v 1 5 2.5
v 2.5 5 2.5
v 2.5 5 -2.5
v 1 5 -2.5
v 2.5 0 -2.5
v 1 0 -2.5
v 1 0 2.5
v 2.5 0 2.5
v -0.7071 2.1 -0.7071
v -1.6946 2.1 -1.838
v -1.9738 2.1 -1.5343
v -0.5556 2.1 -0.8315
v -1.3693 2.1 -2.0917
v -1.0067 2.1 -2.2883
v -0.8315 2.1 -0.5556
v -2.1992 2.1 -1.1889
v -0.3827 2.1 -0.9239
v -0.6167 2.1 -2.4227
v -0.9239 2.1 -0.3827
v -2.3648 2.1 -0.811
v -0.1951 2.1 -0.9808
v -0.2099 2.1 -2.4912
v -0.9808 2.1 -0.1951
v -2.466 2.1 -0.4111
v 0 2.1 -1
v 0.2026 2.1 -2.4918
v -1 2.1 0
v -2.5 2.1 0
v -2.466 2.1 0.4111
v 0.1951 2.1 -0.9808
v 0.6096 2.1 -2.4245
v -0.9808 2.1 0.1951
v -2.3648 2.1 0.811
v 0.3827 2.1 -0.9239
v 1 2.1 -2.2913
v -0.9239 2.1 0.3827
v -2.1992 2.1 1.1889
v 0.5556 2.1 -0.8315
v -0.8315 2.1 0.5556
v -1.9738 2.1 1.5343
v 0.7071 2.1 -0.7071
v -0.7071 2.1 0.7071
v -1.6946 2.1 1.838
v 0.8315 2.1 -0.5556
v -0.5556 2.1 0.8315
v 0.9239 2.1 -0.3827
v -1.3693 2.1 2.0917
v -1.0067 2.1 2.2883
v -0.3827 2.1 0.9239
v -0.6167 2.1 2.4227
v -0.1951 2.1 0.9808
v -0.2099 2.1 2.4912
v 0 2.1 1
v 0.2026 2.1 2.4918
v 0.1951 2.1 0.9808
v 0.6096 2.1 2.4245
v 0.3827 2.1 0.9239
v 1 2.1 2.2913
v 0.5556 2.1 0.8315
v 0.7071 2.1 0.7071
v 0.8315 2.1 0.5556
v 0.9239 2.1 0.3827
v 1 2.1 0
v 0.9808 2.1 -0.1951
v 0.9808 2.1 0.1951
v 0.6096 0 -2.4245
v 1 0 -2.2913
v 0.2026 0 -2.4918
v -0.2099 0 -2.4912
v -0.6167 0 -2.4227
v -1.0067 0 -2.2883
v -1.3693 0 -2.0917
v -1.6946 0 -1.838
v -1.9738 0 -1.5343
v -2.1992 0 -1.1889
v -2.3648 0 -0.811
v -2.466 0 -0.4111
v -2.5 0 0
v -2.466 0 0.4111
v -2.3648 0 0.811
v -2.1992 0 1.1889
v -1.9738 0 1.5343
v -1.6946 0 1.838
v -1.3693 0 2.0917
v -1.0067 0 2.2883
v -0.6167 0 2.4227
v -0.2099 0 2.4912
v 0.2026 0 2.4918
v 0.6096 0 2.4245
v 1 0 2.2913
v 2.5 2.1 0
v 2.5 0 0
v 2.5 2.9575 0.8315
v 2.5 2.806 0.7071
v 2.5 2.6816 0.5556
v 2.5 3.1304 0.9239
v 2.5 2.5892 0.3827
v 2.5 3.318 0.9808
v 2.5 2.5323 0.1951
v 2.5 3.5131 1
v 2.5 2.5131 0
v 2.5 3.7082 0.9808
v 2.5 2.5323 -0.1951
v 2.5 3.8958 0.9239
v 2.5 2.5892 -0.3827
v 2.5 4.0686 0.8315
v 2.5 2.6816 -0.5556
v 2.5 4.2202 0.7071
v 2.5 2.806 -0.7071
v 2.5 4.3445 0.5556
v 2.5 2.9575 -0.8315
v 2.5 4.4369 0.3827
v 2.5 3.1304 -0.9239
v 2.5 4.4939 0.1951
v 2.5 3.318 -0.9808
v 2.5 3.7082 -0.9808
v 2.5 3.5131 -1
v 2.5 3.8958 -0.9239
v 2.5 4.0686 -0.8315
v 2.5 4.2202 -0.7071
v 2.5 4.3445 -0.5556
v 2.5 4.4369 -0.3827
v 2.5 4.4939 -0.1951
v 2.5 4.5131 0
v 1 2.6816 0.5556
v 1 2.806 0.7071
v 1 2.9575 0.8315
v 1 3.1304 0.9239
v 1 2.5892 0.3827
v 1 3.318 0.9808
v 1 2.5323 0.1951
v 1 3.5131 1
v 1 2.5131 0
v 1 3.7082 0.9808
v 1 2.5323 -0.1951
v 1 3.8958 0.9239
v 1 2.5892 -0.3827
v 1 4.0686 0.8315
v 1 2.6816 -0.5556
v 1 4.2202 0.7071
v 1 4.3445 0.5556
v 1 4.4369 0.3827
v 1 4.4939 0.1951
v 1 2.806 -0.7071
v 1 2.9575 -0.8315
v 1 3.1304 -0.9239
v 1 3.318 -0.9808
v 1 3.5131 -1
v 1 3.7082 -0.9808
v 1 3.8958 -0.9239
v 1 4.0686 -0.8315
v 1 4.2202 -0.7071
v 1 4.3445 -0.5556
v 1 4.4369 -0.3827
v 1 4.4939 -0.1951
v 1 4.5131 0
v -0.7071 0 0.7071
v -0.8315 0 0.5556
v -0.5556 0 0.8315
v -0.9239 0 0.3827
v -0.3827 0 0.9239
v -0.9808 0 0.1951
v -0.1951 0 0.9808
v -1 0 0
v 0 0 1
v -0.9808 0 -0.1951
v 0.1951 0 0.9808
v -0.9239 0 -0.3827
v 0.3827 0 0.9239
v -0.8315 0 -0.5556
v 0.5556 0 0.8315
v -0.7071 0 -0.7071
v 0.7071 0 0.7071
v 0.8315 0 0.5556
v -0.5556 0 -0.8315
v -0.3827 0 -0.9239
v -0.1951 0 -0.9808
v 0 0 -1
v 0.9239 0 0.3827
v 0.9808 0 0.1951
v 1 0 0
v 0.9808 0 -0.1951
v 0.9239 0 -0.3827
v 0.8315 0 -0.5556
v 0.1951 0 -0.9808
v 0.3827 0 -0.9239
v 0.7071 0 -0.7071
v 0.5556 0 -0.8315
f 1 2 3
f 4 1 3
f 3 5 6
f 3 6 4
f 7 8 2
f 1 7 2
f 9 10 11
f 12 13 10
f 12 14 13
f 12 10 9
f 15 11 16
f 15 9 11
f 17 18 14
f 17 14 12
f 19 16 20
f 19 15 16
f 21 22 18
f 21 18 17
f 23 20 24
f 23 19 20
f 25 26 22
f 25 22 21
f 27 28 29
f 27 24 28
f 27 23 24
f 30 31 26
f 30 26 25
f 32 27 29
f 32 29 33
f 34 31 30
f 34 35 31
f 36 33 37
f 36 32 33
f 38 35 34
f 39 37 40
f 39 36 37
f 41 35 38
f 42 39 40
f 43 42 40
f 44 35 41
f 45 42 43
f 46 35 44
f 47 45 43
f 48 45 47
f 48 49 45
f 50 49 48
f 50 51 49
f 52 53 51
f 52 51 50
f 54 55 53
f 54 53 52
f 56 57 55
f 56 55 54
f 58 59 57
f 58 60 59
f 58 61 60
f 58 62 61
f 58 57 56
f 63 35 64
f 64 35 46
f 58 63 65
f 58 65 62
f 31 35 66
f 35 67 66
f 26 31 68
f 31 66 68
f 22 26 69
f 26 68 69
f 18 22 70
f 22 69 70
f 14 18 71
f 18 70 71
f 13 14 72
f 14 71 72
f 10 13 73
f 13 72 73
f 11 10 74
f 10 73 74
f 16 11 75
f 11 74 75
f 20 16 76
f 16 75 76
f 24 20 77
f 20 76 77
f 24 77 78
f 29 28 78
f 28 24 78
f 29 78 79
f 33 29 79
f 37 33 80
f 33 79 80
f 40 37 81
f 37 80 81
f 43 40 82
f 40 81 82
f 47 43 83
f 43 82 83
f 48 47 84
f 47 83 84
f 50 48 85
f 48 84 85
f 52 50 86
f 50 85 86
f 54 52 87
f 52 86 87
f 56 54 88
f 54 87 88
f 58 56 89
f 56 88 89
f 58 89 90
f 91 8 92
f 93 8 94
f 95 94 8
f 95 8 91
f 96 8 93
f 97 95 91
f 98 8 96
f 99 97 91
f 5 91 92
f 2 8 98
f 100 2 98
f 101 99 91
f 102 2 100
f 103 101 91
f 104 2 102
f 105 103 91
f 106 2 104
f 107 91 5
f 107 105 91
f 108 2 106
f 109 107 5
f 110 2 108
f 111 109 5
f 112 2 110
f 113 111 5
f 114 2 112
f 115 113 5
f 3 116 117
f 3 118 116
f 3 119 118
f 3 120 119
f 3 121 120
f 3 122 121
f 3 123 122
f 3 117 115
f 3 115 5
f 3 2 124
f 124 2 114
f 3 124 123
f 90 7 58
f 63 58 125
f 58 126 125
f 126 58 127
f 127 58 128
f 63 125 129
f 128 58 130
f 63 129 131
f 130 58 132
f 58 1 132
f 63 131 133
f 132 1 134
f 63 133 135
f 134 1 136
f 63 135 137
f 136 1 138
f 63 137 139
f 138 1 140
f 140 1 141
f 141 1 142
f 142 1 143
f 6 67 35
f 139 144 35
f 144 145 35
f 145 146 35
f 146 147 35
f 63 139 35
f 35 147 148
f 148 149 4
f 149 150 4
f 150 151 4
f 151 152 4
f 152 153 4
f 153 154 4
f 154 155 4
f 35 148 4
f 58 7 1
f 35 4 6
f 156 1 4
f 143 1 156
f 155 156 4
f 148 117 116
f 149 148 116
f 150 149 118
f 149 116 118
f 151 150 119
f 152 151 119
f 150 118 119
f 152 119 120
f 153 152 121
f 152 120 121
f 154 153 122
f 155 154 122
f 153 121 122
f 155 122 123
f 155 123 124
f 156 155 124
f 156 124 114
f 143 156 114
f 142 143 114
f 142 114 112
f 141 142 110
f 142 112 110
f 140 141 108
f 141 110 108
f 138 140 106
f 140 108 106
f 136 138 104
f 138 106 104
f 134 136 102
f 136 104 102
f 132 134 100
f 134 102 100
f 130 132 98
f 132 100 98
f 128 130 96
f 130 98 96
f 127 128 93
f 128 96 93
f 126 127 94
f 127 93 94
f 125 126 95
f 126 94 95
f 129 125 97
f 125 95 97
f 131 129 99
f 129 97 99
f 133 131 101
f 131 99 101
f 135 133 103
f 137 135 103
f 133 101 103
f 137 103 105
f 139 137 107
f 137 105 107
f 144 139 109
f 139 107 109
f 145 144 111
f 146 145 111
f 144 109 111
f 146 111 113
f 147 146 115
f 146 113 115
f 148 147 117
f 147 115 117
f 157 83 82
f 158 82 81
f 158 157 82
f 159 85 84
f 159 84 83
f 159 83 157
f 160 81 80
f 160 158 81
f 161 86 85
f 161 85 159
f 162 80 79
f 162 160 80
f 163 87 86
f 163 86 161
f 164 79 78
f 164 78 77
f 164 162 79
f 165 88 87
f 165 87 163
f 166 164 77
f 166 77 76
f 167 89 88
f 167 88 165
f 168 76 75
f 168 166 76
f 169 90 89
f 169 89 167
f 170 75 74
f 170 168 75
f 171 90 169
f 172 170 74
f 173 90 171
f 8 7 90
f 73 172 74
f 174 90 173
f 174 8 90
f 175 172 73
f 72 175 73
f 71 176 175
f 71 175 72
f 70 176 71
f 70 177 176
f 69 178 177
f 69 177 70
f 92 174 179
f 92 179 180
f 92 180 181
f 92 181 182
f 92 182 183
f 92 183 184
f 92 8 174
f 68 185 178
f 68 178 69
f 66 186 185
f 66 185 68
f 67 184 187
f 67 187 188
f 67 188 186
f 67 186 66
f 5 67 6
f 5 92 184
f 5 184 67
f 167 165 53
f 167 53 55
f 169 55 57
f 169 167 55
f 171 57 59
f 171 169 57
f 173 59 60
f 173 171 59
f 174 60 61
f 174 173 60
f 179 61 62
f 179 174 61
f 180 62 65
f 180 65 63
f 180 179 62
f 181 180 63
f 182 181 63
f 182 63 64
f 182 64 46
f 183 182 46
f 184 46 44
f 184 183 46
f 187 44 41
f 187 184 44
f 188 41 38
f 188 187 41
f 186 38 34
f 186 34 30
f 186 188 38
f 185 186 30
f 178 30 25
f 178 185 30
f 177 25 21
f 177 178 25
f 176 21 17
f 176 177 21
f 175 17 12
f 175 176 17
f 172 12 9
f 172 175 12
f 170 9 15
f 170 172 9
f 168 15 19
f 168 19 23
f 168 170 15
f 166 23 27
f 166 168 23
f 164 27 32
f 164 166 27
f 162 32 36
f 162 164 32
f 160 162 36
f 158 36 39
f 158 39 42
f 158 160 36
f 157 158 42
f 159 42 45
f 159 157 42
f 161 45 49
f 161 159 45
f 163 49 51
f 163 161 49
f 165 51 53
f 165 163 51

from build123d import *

# Parameters (mm, degrees)
SKETCH1_R           = 2.5
SKETCH1_R_2         = 1
BOSS_EXTRUDE2_DEPTH = 2.1
SKETCH2_W           = 5
SKETCH2_H           = 5
SKETCH2_R           = 1
BOSS_EXTRUDE3_DEPTH = 1.5


with BuildPart() as part:
    # Sketch1 → Boss-Extrude2 (new body)
    with BuildSketch(Plane(origin=(0, 0, 0), x_dir=(1, 0, 0), z_dir=(0, 1, 0))):
        with Locations(Location((0, 0, 0), (0, 0, 270))):
            Circle(SKETCH1_R)
        with Locations(Location((0, 0, 0), (0, 0, 270))):
            Circle(SKETCH1_R_2, mode=Mode.SUBTRACT)
    extrude(amount=BOSS_EXTRUDE2_DEPTH)

    # Sketch2 → Boss-Extrude3 (add)
    with BuildSketch(Plane(origin=(2.5, 0, 0), x_dir=(0, 0, -1), z_dir=(1, 0, 0))):
        with Locations((0, 2.5)):
            Rectangle(SKETCH2_W, SKETCH2_H)
        with Locations((0, 3.513067933)):
            Circle(SKETCH2_R, mode=Mode.SUBTRACT)
    extrude(amount=-BOSS_EXTRUDE3_DEPTH)


solid = part.part
